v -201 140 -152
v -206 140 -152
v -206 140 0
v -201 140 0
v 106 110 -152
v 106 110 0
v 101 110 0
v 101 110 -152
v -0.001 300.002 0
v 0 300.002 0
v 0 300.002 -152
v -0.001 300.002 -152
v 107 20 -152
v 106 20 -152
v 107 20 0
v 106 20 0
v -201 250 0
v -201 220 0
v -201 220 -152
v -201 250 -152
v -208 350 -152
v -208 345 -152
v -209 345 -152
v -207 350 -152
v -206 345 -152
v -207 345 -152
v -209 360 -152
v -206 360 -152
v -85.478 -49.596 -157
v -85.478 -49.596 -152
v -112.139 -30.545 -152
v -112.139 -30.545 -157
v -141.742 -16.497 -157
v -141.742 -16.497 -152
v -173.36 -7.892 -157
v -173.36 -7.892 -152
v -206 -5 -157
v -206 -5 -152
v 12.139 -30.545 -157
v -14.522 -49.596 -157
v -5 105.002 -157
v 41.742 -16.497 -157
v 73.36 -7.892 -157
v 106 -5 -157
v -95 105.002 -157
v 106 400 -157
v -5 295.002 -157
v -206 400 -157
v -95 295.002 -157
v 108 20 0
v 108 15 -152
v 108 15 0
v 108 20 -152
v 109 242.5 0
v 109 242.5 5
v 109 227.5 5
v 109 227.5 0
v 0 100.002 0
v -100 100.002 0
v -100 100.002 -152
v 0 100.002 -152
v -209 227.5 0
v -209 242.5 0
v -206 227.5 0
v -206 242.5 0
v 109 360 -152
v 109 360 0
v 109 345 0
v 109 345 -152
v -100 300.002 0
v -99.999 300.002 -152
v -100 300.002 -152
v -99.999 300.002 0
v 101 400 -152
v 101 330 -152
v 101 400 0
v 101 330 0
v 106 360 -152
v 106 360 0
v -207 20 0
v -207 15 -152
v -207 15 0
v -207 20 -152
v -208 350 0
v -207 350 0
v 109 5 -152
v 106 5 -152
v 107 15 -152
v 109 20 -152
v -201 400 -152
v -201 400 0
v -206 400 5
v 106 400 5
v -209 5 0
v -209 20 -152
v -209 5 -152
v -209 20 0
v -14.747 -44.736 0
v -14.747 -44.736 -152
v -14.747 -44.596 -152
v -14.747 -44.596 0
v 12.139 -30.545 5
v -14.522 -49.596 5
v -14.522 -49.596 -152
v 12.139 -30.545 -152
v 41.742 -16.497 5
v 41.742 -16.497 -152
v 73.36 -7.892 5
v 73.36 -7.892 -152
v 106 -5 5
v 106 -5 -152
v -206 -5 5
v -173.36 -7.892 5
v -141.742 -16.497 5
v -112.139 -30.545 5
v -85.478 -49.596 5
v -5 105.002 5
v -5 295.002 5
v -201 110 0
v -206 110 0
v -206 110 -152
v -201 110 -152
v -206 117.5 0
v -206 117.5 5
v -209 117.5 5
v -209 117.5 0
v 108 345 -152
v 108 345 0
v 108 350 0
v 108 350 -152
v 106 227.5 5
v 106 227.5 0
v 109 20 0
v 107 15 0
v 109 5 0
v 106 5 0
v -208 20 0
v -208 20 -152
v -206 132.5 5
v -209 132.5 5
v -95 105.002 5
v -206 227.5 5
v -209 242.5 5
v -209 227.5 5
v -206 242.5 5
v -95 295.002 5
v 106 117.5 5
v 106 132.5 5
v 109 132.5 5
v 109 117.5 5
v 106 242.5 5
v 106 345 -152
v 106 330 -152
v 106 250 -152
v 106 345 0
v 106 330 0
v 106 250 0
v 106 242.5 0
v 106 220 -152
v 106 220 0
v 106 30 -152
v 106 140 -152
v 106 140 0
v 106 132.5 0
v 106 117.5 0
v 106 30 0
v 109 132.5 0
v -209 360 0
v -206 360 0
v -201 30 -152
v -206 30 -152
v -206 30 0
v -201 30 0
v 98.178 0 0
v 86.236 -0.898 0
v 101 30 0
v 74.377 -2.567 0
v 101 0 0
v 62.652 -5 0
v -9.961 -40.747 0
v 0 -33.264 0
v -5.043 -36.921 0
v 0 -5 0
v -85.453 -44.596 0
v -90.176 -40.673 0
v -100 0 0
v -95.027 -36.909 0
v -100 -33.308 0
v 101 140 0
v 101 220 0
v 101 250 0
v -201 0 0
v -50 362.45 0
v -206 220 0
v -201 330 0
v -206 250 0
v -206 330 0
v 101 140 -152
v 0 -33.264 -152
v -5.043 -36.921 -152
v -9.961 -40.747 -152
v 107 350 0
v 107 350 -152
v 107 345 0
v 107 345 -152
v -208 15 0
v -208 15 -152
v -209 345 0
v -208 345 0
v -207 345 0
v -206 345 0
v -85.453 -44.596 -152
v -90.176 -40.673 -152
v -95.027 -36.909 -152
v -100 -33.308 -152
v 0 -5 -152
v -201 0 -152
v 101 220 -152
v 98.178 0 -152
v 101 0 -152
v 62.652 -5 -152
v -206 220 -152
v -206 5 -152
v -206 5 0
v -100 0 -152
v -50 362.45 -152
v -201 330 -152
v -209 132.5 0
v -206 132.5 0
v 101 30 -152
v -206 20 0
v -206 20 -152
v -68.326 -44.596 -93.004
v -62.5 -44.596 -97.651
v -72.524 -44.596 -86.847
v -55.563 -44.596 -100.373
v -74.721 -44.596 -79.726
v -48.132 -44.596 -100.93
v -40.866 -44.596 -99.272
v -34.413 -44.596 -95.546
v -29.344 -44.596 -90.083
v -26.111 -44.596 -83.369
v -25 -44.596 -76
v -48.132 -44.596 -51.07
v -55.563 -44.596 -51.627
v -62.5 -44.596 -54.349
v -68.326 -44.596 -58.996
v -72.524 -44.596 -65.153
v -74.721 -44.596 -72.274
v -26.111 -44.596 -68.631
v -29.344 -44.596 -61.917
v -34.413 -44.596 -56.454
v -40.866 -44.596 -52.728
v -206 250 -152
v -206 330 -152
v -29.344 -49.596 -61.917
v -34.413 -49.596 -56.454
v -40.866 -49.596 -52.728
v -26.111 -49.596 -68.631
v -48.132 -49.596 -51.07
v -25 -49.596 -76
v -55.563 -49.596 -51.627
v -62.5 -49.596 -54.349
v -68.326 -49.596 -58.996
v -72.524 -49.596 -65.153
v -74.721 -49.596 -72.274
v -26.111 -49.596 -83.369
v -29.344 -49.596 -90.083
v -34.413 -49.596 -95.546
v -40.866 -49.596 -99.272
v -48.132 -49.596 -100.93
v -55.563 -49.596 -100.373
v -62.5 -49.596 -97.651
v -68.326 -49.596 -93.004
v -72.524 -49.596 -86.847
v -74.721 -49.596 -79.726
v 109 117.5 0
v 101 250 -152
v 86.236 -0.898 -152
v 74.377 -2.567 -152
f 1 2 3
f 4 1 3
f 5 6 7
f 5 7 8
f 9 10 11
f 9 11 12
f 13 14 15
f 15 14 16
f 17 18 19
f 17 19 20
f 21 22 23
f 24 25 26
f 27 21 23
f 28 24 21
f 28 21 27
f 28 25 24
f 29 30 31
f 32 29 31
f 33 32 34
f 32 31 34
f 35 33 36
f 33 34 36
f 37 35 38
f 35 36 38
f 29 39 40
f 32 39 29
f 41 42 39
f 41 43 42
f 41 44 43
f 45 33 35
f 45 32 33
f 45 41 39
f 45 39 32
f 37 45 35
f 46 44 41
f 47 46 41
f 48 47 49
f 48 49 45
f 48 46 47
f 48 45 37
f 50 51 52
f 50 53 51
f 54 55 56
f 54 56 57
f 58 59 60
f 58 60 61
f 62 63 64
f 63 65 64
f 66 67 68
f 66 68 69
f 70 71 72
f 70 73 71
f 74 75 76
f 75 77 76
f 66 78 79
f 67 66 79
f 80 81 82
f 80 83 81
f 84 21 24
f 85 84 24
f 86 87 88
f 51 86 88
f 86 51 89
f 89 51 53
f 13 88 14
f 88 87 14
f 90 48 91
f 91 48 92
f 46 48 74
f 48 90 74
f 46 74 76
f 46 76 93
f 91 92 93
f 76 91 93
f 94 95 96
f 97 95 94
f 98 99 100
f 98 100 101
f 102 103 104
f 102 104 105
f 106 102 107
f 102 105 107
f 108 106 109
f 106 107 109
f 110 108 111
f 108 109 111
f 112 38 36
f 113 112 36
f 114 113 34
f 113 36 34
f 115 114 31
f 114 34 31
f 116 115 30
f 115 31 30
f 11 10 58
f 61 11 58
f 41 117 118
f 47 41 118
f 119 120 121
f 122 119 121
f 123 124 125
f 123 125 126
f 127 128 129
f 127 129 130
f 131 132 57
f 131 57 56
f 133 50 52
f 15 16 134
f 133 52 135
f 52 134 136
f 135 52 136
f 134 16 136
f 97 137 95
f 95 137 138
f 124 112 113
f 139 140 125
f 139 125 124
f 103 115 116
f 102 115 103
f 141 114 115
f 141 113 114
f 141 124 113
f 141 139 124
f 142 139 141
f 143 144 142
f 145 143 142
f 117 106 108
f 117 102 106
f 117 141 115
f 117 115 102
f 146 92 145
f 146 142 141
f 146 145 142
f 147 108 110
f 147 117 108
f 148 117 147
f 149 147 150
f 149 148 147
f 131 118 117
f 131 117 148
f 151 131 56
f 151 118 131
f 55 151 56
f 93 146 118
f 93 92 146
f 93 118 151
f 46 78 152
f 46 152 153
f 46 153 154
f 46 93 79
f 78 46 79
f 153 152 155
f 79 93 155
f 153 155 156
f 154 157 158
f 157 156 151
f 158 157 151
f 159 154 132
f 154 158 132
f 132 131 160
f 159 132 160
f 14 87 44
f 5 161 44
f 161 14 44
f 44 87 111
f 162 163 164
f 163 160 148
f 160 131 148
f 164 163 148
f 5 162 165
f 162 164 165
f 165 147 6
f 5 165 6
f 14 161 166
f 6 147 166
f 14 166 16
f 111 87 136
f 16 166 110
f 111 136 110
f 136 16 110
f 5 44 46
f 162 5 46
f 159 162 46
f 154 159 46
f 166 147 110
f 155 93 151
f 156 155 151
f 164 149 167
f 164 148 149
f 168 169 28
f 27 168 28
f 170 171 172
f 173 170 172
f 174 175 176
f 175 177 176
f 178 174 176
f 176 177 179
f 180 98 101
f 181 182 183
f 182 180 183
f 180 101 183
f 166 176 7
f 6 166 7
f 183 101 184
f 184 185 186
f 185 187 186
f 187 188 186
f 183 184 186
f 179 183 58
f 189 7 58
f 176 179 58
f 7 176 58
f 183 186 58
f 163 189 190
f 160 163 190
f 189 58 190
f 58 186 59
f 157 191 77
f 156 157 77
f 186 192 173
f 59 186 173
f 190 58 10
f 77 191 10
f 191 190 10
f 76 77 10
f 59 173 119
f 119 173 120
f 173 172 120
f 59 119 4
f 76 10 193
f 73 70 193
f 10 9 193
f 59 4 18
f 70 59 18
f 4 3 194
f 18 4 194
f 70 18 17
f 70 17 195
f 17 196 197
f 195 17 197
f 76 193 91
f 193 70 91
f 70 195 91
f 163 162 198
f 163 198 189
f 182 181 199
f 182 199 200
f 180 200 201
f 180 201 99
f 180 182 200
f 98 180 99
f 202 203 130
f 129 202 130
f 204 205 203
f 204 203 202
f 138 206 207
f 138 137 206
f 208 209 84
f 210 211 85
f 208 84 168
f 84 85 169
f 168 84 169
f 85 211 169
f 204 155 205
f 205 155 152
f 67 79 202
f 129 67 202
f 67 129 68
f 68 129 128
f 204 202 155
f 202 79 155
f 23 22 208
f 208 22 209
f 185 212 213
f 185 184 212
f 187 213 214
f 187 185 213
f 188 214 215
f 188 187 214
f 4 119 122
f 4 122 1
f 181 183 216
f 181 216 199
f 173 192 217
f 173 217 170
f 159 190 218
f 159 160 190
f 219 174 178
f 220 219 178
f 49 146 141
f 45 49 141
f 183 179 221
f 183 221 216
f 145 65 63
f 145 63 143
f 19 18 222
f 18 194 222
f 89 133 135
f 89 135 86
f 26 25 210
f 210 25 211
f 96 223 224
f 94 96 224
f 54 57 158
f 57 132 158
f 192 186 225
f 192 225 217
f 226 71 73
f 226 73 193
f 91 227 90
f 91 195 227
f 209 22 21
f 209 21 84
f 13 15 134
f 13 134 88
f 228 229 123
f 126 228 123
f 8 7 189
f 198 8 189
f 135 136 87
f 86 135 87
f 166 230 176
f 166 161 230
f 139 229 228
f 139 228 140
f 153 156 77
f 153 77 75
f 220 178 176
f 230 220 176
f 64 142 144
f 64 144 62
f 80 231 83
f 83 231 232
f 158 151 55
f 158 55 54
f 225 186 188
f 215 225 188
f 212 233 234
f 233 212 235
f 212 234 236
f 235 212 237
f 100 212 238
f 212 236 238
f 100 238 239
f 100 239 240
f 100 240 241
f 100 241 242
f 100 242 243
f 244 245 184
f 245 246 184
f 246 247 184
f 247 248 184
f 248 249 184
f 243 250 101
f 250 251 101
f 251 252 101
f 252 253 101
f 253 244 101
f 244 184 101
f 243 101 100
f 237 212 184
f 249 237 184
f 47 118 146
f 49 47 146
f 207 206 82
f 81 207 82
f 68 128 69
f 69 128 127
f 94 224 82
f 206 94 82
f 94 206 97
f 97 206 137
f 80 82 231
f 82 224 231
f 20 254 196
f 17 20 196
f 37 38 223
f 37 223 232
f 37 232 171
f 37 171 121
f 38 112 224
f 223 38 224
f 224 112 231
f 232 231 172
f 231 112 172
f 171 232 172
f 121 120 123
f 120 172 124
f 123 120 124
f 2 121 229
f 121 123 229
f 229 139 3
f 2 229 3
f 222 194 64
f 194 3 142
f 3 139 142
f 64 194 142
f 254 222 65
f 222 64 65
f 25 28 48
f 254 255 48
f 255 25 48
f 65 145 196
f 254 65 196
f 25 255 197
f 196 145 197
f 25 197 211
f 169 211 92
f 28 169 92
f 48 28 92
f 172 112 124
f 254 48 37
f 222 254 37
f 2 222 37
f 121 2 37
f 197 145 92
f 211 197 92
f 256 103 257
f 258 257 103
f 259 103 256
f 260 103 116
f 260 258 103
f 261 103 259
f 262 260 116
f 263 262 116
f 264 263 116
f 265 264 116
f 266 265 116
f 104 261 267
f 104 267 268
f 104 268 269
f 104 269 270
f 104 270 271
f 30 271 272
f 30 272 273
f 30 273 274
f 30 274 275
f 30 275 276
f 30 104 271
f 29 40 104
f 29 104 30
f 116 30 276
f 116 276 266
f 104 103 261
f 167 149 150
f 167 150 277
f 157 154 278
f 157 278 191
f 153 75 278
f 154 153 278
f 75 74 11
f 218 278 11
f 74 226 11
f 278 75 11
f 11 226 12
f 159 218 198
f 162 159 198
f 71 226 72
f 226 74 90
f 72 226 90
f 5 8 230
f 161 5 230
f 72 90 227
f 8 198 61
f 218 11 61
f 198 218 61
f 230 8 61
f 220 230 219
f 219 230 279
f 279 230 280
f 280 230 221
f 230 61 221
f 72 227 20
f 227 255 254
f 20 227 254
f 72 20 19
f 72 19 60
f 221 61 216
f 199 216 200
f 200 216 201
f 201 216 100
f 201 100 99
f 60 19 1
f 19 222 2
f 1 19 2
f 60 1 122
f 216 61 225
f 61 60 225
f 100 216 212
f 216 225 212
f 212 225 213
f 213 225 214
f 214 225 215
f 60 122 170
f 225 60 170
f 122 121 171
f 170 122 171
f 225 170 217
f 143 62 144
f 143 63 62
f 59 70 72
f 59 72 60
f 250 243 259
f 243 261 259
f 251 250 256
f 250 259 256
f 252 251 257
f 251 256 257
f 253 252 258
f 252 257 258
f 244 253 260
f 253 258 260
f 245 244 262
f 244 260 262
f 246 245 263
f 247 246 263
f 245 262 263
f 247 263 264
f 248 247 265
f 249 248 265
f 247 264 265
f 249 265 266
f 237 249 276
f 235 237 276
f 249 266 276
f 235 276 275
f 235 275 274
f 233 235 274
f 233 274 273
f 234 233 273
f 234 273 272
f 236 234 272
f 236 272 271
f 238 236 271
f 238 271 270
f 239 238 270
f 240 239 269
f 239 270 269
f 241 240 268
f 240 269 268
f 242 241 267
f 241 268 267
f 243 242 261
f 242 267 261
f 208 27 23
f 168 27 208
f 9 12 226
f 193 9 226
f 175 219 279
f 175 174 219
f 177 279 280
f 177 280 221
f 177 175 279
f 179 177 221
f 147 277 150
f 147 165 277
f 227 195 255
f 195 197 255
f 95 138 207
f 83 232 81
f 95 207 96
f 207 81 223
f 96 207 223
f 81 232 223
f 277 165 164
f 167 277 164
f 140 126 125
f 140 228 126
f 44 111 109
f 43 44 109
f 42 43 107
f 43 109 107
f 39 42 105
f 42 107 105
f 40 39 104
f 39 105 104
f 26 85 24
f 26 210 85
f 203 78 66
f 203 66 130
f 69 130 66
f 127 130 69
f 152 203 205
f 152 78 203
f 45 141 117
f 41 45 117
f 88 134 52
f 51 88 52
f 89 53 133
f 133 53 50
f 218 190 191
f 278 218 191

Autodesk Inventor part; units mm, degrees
ref_plane "YZ Plane" through (0, 0, 0) normal (1, 0, 0) x (0, 1, 0)
sketch "Boceto1" plane through (0, 0, 0) normal (0, 0, 1) x (1, 0, 0)
  line L0 (0, 0) -> (100, 0)
  line L1 (0, 300.0017) -> (0, 100.0017)
  line L2 (0, 0) -> (101, 0)
  line L3 (101, 0) -> (101, 400)
  line L4 (101, 400) -> (0, 400)
  line L5 (0, 300.0017) -> (0, 100.0017)
  line L6 (0, 0) -> (98.1777, 0) construction
  line L7 (98.1777, 0) -> (98.1777, 330) construction
  line L8 (98.1777, 330) -> (0, 330) construction
  line L9 (0, 330) -> (0, 0) construction
  line L10 (0, 300.0017) -> (-100, 300.0017) construction
  line L11 (-100, 300.0017) -> (-100, 100.0017) construction
  line L12 (-100, 100.0017) -> (0, 100.0017) construction
  line L13 (0, 100.0017) -> (0, 300.0017) construction
  line L14 (0, 300.0017) -> (-100, 300.0017)
  line L15 (-100, 300.0017) -> (-100, 100.0017)
  line L16 (-100, 100.0017) -> (0, 100.0017)
  line L17 (0, 100.0017) -> (0, 300.0017)
  line L18 (-100, 0) -> (-201, 0)
  line L19 (-201, 0) -> (-201, 400)
  line L20 (-201, 400) -> (-100, 400)
  line L21 (-100, 300.0017) -> (-100, 100.0017)
  line L22 (-100, 0) -> (0, 0)
  line L23 (-100, 400) -> (0, 400)
  line L24 (-95, 105.0017) -> (-5, 105.0017)
  line L25 (-5, 105.0017) -> (-5, 295.0017)
  line L26 (-5, 295.0017) -> (-95, 295.0017)
  line L27 (-95, 295.0017) -> (-95, 105.0017)
  line L28 (106, 400) -> (106, -5)
  line L29 (106, -5) -> (-206, -5)
  line L30 (-206, -5) -> (-206, 400)
  line L31 (-206, 400) -> (-201, 400)
  line L32 (101, 400) -> (106, 400)
  line L33 (-100, 100.0017) -> (-100, 0) construction
  line L34 (-50, -5) -> (-50, -60) construction
  arc A0 (-61.35, -74.5956) -> (-206, -5) centre (-205.942, -190) ccw
  arc A1 (106, -5) -> (-38.65, -74.5956) centre (105.942, -190) ccw
  line L35 (-38.65, -74.5956) -> (-38.65, -69.5956)
  line L36 (-61.35, -74.5956) -> (-61.35, -69.5956)
  line L37 (-61.35, -69.5956) -> (-38.65, -69.5956)
  line L38 (-100, 0) -> (-100, -33.3083)
  line L39 (0, 0) -> (0, -33.2635)
  line L40 (-100, 400) -> (-100, 300.0017) construction
  line L41 (-69.5521, -60) -> (-30.4598, -60)
  line L42 (-50, -65) -> (-30.4399, -65)
  line L43 (-30.4399, -65) -> (-69.5601, -65)
  arc A2 (98.1777, 0) -> (-30.4598, -60) centre (106.0764, -184.8313) ccw
  arc A3 (-69.5521, -60) -> (-201, 0) centre (-205.9958, -184.9325) ccw
  point P0 (-162.9925, -5)
  point P1 (-100, -5)
  point P2 (62.6517, -5)
  point P3 (0, -5)
  dimension "d2" = 101
  dimension "d9" = 101
  dimension "d11" = 400
  dimension "d12" = 100
  dimension "d13" = 200
  dimension "d14" = 100
  dimension "d15" = 5
  dimension "d16" = 5
  dimension "d17" = 5
  dimension "d18" = 5
  dimension "d19" = 5
  dimension "d20" = 5
  dimension "d22" = 55
  dimension "d27" = 302
  dimension "d30" = 185
  dimension "d31" = 185
  dimension "d33" = 5
  dimension "d36" = 5
  dimension "d120" = 5
extrude "Extrusión1" add sketch "Boceto1" against normal blind 152 contours L30 L31 L19 A3 L29 | L0 L2 L3 L32 L28 L29 A2 | L38 L29 A3 L18 | L29 A2 L39 | L29 A1 L42 L43 A0 A3 L41 A2 | L38 A3 L29 | A1 L35 L37 L36 A0 L43 L42 | L1 L16 L15 L14
sketch "Boceto2" plane through (0, 0, 0) normal (0, 0, 1) x (1, 0, 0)
  line L0 (-206, 400) -> (-206, -5) projected
  line L1 (106, -5) -> (106, 400) projected
  arc A0 (106, -5) -> (-38.65, -74.5956) centre (105.942, -190) ccw projected
  arc A1 (-61.35, -74.5956) -> (-206, -5) centre (-205.942, -190) ccw projected
  line L2 (-61.35, -74.5956) -> (-38.65, -74.5956) projected
  line L3 (-206, 400) -> (106, 400)
  line L4 (-201, 0) -> (-201, 400) projected
  line L5 (0, 300.0017) -> (-100, 300.0017) projected
  line L6 (0, 100.0017) -> (0, 300.0017) projected
  line L7 (-95, 105.0017) -> (-95, 295.0017) projected
  line L8 (-5, 295.0017) -> (-5, 105.0017) projected
  line L9 (-5, 105.0017) -> (-95, 105.0017) projected
  line L10 (-95, 295.0017) -> (-5, 295.0017) projected
  point P0 (0, 0)
extrude "Extrusión2" add sketch "Boceto2" along normal blind 5
ref_plane "Plano de trabajo1" through (106, -5, -152) normal (0, 0, -1) x (-1, 0, 0)
sketch "Boceto5" plane through (106, -5, -152) normal (0, 0, -1) x (-1, 0, 0)
  line L0 (312, 0) -> (312, 405) projected
  line L1 (312, 405) -> (307, 405) projected
  line L2 (5, 405) -> (307, 405) projected
  line L3 (5, 405) -> (0, 405) projected
  line L4 (0, 405) -> (0, 0) projected
  arc A0 (144.65, -69.5956) -> (0, 0) centre (0.058, -185) ccw projected
  line L5 (144.65, -69.5956) -> (167.35, -69.5956)
  arc A1 (312, 0) -> (167.35, -69.5956) centre (311.942, -185) ccw projected
  line L6 (201, 110.0017) -> (111, 110.0017) projected
  line L7 (111, 110.0017) -> (111, 300.0017) projected
  line L8 (111, 300.0017) -> (201, 300.0017) projected
  line L9 (201, 300.0017) -> (201, 110.0017) projected
  point P0 (106, 5)
extrude "Extrusión3" add sketch "Boceto5" along normal blind 5
sketch "Boceto7" plane through (-206, -5, 5) normal (-1, 0, 0) x (0, 0, 1)
  line L0 (-162, 0) -> (0, 0) construction
  line L1 (-81, 0) -> (-81, 5) construction
  line L2 (-81, 5) -> (-81, 35) construction
  line L3 (-81, 35) -> (-81, 115) construction
  line L4 (-81, 115) -> (-81, 145) construction
  line L5 (-81, 145) -> (-81, 225) construction
  line L6 (-81, 225) -> (-81, 255) construction
  line L7 (-81, 255) -> (-81, 335) construction
  line L8 (-157, 35) -> (-5, 35)
  line L9 (-5, 35) -> (-5, 115)
  line L10 (-5, 115) -> (-157, 115)
  line L11 (-157, 115) -> (-157, 35)
  line L12 (0, 405) -> (0, 0) projected
  line L13 (-162, 0) -> (-162, 405) projected
  line L14 (-5, 225) -> (-157, 225)
  line L15 (-157, 225) -> (-157, 145)
  line L16 (-157, 145) -> (-5, 145)
  line L17 (-5, 145) -> (-5, 225)
  line L18 (-5, 335) -> (-157, 335)
  line L19 (-157, 335) -> (-157, 255)
  line L20 (-157, 255) -> (-5, 255)
  line L21 (-5, 255) -> (-5, 335)
  point P0 (-5, 5)
  dimension "d47" = 5
  dimension "d48" = 30
  dimension "d49" = 80
  dimension "d50" = 30
  dimension "d51" = 80
  dimension "d52" = 30
  dimension "d53" = 80
  dimension "d54" = 5
  dimension "d55" = 5
  dimension "d58" = 110
sketch "Boceto8" plane through (106, -5, 5) normal (1, 0, 0) x (0, 0, -1)
  line L0 (5, 335) -> (157, 335) projected
  line L1 (157, 335) -> (157, 255) projected
  line L2 (157, 255) -> (5, 255) projected
  line L3 (5, 255) -> (5, 335) projected
  line L4 (5, 225) -> (157, 225) projected
  line L5 (157, 225) -> (157, 145) projected
  line L6 (157, 145) -> (5, 145) projected
  line L7 (5, 145) -> (5, 225) projected
  line L8 (5, 115) -> (157, 115) projected
  line L9 (157, 115) -> (157, 35) projected
  line L10 (157, 35) -> (5, 35) projected
  line L11 (5, 35) -> (5, 115) projected
  point P0 (5, 5)
extrude "Extrusión5" cut sketch "Boceto7" against normal blind 5
extrude "Extrusión6" cut sketch "Boceto8" against normal blind 5
sketch "Boceto9" plane through (106, -5, -152) normal (0, 0, 1) x (1, 0, 0)
  line L0 (0, 405) -> (0, 0) construction
  line L1 (0, 372.4568) -> (-312, 372.4568) construction
  line L2 (-312, 0) -> (-312, 405) construction
  line L3 (-156, 372.4568) -> (-156, 300.0017) construction
  line L4 (-111, 300.0017) -> (-201, 300.0017) construction
  line L5 (-312, 405) -> (0, 405) construction
  line L6 (-156, 405) -> (-156, 385) construction
  line L7 (-106, 405) -> (-106, 305) construction
  line L8 (-106, 305) -> (-206, 305) construction
  line L9 (-206, 305) -> (-106, 305)
  line L10 (-206, 305) -> (-156, 367.45)
  line L11 (-106, 305) -> (-156, 367.45)
  point P0 (-106, 5)
  dimension "d71" = 20
  dimension "d72" = 100
  dimension "d73" = 80
extrude "Extrusión7" add sketch "Boceto9" along normal blind 152
sketch "Boceto11" plane through (106, -5, 5) normal (1, 0, 0) x (0, 0, -1)
  line L0 (157, 405) -> (157, 335) projected
  line L1 (5, 350) -> (157, 350)
  line L2 (157, 350) -> (157, 365)
  line L3 (157, 365) -> (5, 365)
  line L4 (5, 365) -> (5, 350)
  line L5 (5, 105.0017) -> (5, 305.0017) projected
  line L6 (5, 10) -> (157, 10)
  line L7 (157, 10) -> (157, 25)
  line L8 (157, 25) -> (5, 25)
  line L9 (5, 25) -> (5, 10)
  line L10 (162, 405) -> (0, 405) projected
  line L11 (157, 35) -> (5, 35) projected
  line L12 (0, 405) -> (0, 0) projected
  line L13 (5, 122.5) -> (0, 122.5)
  line L14 (0, 122.5) -> (0, 137.5)
  line L15 (0, 137.5) -> (5, 137.5)
  line L16 (5, 137.5) -> (5, 122.5)
  line L17 (5, 232.5) -> (0, 232.5)
  line L18 (0, 232.5) -> (0, 247.5)
  line L19 (0, 247.5) -> (5, 247.5)
  line L20 (5, 247.5) -> (5, 232.5)
  line L21 (157, 255) -> (5, 255) projected
  line L22 (5, 225) -> (157, 225) projected
  line L23 (157, 145) -> (5, 145) projected
  line L24 (5, 115) -> (157, 115) projected
  point P0 (5, 5)
  dimension "d79" = 152
  dimension "d80" = 40
  dimension "d81" = 15
  dimension "d84" = 15
  dimension "d89" = 10
  dimension "d92" = 7.5
  dimension "d93" = 7.5
  dimension "d94" = 7.5
  dimension "d95" = 7.5
extrude "Extrusión8" add sketch "Boceto11" along normal blind 3 contours L0 L1 L4 L3 | L19 L5 L17 L12 | L15 L5 L13 L12 | L9 L8 L7 L6
sketch "Boceto12" plane through (106, 345, -152) normal (0, -1, 0) x (1, 0, 0)
  line L0 (1, 152) -> (2, 152)
  line L1 (2, 152) -> (2, 0)
  line L2 (2, 0) -> (1, 0)
  line L3 (1, 0) -> (1, 152)
  line L4 (0, 152) -> (0, 0) projected
  line L5 (0, 152) -> (3, 152) projected
  line L6 (0, 0) -> (3, 0) projected
  point P0 (-106, 152)
  dimension "d96" = 1
  dimension "d97" = 1
  dimension "d98" = 0
  dimension "d99" = 0
extrude "Extrusión9" cut sketch "Boceto12" against normal blind 5 contours L0 L1 L2 L3
sketch "Boceto13" plane through (106, 20, 0) normal (0, 1, 0) x (1, 0, 0)
  line L0 (2, 0) -> (1, 0)
  line L1 (1, 0) -> (1, 152)
  line L2 (1, 152) -> (2, 152)
  line L3 (2, 152) -> (2, 0)
  line L4 (0, 0) -> (3, 0) projected
  line L5 (0, 0) -> (0, 152) projected
  line L6 (0, 152) -> (3, 152) projected
  point P0 (-106, 0)
  dimension "d102" = 0
  dimension "d103" = 1
  dimension "d104" = 1
  dimension "d105" = 0
extrude "Extrusión10" cut sketch "Boceto13" against normal blind 5 contours L0 L1 L2 L3
ref_plane "Plano de trabajo2" through (-50, -5, -157) normal (1, 0, 0) x (0, 0, -1)
mirror "Simetría1" about plane through (-50, -5, -157) normal (1, 0, 0) of "Extrusión8"
sketch "Boceto14" plane through (-206, 20, 0) normal (0, 1, 0) x (1, 0, 0)
  line L0 (-2, 152) -> (-1, 152)
  line L1 (-1, 152) -> (-1, 0)
  line L2 (-1, 0) -> (-2, 0)
  line L3 (-2, 0) -> (-2, 152)
  line L4 (0, 152) -> (-3, 152) projected
  line L5 (-3, 152) -> (-3, 0) projected
  line L6 (0, 0) -> (-3, 0) projected
  point P0 (206, 0)
  dimension "d108" = 0
  dimension "d109" = 1
  dimension "d110" = 1
  dimension "d111" = 0
extrude "Extrusión11" cut sketch "Boceto14" against normal blind 5 contours L0 L1 L2 L3
sketch "Boceto15" plane through (-206, 345, -152) normal (0, -1, 0) x (1, 0, 0)
  line L0 (-1, 0) -> (-2, 0)
  line L1 (-2, 0) -> (-2, 152)
  line L2 (-2, 152) -> (-1, 152)
  line L3 (-1, 152) -> (-1, 0)
  line L4 (0, 0) -> (-3, 0) projected
  line L5 (-3, 0) -> (-3, 152) projected
  line L6 (0, 152) -> (-3, 152) projected
  point P0 (206, 152)
  dimension "d114" = 0
  dimension "d115" = 1
  dimension "d116" = 1
  dimension "d117" = 0
extrude "Extrusión12" cut sketch "Boceto15" against normal blind 5 contours L0 L1 L2 L3
sketch "Sketch16" plane through (-61.35, -69.5956, 0) normal (0, -1, 0) x (1, 0, 0)
  line L0 (11.35, -152) -> (11.35, 0) projected
  circle A0 centre (11.35, -76) radius 15
  point P0 (61.35, 0)
  dimension "d121" = 30
extrude "Extrusion13" cut sketch "Sketch16" along normal mid plane 30
sketch "Sketch17" plane through (106, -5, -157) normal (0, 0, -1) x (-1, 0, 0)
  line L0 (131, -44.5956) -> (120.5222, -44.5956)
  arc A0 (144.65, -69.5956) -> (0, 0) centre (0.058, -185) ccw projected
  line L1 (181, -44.5956) -> (191.4778, -44.5956)
  arc A1 (312, 0) -> (167.35, -69.5956) centre (311.942, -185) ccw projected
  line L2 (191.4778, -44.5956) -> (120.5218, -44.5956)
  line L3 (120.5218, -44.5956) -> (120.5218, -69.5956)
  line L4 (120.5218, -69.5956) -> (191.4778, -69.5956)
  line L5 (191.4778, -69.5956) -> (191.4778, -44.5956)
  line L6 (167.35, -69.5956) -> (144.65, -69.5956) projected
  line L7 (156, -69.5956) -> (120.5218, -69.5956)
  line L8 (167.35, -69.5956) -> (144.65, -69.5956) projected
  point P0 (106, 5)
  point P1 (155.7098, -69.5956)
  point P2 (144.65, -69.5956)
  point P3 (167.35, -69.5956)
  dimension "d124" = 50
  dimension "d134" = 25
  dimension "d135" = 70.956
  dimension "d136" = 35.4778
  dimension "d137" = 35.188
extrude "Extrusion14" cut sketch "Sketch17" against normal blind 200 contours L2 L1 A1 L4 A0 L0
sketch "Sketch18" plane through (-85.4778, -49.5956, -157) normal (0, -1, 0) x (1, 0, 0)
  point P0 (85.4778, 157)
sketch "Sketch19" plane through (-85.4778, -49.5956, -157) normal (0, -1, 0) x (1, 0, 0)
  line L0 (191.4778, 162) -> (-120.5222, 162) projected
  line L1 (0, 0) -> (-120.5222, 0) projected
  line L2 (70.7311, 162) -> (0, 162)
  line L3 (0, 162) -> (0, 0)
  line L4 (0, 0) -> (70.7311, 0)
  line L5 (70.7311, 0) -> (70.7311, 162)
  point P0 (85.4778, 157)
extrude "Extrusion15" add sketch "Sketch19" against normal blind 5
sketch "Sketch20" plane through (-85.4778, -49.5956, -157) normal (0, -1, 0) x (1, 0, 0)
  circle A0 centre (35.4778, 81) radius 25
  line L0 (70.9556, 0) -> (0, 0) projected
  line L1 (0, 162) -> (70.9556, 162) projected
  line L2 (191.4778, 162) -> (-120.5222, 162) projected
  line L3 (35.4778, 162) -> (35.4778, 81)
  line L4 (35.4778, 5) -> (35.4778, 157) projected
  point P0 (85.4778, 157)
  dimension "d129" = 50
  dimension "d138" = 162
  dimension "d139" = 81
extrude "Extrusion16" cut sketch "Sketch20" against normal blind 10
equation "\"d16\" = d15"
equation "\"d17\" = d15"
equation "\"d18\" = d15"
equation "\"d19\" = d15"
equation "\"d20\" = d15"
equation "\"d31\" = d30"
equation "\"d84\" = d81"
properties part number "Contenedor" material "Acrylic"
